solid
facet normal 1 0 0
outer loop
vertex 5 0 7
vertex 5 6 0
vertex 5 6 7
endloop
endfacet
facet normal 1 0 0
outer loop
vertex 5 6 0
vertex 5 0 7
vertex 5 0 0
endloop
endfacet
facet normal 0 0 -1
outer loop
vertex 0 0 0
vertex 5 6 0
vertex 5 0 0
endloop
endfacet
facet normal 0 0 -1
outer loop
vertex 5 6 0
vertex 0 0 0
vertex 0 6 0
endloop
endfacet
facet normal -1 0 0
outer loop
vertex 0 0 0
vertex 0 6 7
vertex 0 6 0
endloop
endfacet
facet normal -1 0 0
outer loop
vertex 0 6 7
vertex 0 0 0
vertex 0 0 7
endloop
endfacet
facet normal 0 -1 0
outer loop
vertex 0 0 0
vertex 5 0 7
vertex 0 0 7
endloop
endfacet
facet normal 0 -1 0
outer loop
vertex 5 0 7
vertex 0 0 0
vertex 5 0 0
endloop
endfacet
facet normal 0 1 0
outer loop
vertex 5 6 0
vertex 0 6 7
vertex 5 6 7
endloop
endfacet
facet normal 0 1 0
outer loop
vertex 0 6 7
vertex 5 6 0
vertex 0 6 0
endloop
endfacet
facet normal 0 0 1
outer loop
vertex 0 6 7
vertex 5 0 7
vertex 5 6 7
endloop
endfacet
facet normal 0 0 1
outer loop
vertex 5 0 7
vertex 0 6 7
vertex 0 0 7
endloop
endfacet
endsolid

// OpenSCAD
translate([2.5, 1.5, 1.0]) color([0.5198341022016146, 0.5739818030823766, 0.6271396891048426]) cube([5, 3, 2], center=true);
translate([2.5, 4.5, 1.0]) color([0.5313758038379728, 0.4108045023355995, 0.634594012376466]) cube([5, 3, 2], center=true);
translate([2.5, 1.0, 3.5]) color([0.40341287658681757, 0.7785502590540477, 0.7881774252549901]) cube([5, 2, 3], center=true);
translate([2.5, 3.0, 3.5]) color([0.29225416811082217, 0.37180432355577453, 0.6288109059468862]) cube([5, 2, 3], center=true);
translate([2.5, 5.0, 3.5]) color([0.15706996711565713, 0.6970319309869248, 0.3814277529807131]) cube([5, 2, 3], center=true);
translate([2.5, 1.5, 6.0]) color([0.591062474757007, 0.1395330992312218, 0.6682583860975598]) cube([5, 3, 2], center=true);
translate([2.5, 4.5, 6.0]) color([0.3540578606136997, 0.4726655762072315, 0.4151074008495357]) cube([5, 3, 2], center=true);
